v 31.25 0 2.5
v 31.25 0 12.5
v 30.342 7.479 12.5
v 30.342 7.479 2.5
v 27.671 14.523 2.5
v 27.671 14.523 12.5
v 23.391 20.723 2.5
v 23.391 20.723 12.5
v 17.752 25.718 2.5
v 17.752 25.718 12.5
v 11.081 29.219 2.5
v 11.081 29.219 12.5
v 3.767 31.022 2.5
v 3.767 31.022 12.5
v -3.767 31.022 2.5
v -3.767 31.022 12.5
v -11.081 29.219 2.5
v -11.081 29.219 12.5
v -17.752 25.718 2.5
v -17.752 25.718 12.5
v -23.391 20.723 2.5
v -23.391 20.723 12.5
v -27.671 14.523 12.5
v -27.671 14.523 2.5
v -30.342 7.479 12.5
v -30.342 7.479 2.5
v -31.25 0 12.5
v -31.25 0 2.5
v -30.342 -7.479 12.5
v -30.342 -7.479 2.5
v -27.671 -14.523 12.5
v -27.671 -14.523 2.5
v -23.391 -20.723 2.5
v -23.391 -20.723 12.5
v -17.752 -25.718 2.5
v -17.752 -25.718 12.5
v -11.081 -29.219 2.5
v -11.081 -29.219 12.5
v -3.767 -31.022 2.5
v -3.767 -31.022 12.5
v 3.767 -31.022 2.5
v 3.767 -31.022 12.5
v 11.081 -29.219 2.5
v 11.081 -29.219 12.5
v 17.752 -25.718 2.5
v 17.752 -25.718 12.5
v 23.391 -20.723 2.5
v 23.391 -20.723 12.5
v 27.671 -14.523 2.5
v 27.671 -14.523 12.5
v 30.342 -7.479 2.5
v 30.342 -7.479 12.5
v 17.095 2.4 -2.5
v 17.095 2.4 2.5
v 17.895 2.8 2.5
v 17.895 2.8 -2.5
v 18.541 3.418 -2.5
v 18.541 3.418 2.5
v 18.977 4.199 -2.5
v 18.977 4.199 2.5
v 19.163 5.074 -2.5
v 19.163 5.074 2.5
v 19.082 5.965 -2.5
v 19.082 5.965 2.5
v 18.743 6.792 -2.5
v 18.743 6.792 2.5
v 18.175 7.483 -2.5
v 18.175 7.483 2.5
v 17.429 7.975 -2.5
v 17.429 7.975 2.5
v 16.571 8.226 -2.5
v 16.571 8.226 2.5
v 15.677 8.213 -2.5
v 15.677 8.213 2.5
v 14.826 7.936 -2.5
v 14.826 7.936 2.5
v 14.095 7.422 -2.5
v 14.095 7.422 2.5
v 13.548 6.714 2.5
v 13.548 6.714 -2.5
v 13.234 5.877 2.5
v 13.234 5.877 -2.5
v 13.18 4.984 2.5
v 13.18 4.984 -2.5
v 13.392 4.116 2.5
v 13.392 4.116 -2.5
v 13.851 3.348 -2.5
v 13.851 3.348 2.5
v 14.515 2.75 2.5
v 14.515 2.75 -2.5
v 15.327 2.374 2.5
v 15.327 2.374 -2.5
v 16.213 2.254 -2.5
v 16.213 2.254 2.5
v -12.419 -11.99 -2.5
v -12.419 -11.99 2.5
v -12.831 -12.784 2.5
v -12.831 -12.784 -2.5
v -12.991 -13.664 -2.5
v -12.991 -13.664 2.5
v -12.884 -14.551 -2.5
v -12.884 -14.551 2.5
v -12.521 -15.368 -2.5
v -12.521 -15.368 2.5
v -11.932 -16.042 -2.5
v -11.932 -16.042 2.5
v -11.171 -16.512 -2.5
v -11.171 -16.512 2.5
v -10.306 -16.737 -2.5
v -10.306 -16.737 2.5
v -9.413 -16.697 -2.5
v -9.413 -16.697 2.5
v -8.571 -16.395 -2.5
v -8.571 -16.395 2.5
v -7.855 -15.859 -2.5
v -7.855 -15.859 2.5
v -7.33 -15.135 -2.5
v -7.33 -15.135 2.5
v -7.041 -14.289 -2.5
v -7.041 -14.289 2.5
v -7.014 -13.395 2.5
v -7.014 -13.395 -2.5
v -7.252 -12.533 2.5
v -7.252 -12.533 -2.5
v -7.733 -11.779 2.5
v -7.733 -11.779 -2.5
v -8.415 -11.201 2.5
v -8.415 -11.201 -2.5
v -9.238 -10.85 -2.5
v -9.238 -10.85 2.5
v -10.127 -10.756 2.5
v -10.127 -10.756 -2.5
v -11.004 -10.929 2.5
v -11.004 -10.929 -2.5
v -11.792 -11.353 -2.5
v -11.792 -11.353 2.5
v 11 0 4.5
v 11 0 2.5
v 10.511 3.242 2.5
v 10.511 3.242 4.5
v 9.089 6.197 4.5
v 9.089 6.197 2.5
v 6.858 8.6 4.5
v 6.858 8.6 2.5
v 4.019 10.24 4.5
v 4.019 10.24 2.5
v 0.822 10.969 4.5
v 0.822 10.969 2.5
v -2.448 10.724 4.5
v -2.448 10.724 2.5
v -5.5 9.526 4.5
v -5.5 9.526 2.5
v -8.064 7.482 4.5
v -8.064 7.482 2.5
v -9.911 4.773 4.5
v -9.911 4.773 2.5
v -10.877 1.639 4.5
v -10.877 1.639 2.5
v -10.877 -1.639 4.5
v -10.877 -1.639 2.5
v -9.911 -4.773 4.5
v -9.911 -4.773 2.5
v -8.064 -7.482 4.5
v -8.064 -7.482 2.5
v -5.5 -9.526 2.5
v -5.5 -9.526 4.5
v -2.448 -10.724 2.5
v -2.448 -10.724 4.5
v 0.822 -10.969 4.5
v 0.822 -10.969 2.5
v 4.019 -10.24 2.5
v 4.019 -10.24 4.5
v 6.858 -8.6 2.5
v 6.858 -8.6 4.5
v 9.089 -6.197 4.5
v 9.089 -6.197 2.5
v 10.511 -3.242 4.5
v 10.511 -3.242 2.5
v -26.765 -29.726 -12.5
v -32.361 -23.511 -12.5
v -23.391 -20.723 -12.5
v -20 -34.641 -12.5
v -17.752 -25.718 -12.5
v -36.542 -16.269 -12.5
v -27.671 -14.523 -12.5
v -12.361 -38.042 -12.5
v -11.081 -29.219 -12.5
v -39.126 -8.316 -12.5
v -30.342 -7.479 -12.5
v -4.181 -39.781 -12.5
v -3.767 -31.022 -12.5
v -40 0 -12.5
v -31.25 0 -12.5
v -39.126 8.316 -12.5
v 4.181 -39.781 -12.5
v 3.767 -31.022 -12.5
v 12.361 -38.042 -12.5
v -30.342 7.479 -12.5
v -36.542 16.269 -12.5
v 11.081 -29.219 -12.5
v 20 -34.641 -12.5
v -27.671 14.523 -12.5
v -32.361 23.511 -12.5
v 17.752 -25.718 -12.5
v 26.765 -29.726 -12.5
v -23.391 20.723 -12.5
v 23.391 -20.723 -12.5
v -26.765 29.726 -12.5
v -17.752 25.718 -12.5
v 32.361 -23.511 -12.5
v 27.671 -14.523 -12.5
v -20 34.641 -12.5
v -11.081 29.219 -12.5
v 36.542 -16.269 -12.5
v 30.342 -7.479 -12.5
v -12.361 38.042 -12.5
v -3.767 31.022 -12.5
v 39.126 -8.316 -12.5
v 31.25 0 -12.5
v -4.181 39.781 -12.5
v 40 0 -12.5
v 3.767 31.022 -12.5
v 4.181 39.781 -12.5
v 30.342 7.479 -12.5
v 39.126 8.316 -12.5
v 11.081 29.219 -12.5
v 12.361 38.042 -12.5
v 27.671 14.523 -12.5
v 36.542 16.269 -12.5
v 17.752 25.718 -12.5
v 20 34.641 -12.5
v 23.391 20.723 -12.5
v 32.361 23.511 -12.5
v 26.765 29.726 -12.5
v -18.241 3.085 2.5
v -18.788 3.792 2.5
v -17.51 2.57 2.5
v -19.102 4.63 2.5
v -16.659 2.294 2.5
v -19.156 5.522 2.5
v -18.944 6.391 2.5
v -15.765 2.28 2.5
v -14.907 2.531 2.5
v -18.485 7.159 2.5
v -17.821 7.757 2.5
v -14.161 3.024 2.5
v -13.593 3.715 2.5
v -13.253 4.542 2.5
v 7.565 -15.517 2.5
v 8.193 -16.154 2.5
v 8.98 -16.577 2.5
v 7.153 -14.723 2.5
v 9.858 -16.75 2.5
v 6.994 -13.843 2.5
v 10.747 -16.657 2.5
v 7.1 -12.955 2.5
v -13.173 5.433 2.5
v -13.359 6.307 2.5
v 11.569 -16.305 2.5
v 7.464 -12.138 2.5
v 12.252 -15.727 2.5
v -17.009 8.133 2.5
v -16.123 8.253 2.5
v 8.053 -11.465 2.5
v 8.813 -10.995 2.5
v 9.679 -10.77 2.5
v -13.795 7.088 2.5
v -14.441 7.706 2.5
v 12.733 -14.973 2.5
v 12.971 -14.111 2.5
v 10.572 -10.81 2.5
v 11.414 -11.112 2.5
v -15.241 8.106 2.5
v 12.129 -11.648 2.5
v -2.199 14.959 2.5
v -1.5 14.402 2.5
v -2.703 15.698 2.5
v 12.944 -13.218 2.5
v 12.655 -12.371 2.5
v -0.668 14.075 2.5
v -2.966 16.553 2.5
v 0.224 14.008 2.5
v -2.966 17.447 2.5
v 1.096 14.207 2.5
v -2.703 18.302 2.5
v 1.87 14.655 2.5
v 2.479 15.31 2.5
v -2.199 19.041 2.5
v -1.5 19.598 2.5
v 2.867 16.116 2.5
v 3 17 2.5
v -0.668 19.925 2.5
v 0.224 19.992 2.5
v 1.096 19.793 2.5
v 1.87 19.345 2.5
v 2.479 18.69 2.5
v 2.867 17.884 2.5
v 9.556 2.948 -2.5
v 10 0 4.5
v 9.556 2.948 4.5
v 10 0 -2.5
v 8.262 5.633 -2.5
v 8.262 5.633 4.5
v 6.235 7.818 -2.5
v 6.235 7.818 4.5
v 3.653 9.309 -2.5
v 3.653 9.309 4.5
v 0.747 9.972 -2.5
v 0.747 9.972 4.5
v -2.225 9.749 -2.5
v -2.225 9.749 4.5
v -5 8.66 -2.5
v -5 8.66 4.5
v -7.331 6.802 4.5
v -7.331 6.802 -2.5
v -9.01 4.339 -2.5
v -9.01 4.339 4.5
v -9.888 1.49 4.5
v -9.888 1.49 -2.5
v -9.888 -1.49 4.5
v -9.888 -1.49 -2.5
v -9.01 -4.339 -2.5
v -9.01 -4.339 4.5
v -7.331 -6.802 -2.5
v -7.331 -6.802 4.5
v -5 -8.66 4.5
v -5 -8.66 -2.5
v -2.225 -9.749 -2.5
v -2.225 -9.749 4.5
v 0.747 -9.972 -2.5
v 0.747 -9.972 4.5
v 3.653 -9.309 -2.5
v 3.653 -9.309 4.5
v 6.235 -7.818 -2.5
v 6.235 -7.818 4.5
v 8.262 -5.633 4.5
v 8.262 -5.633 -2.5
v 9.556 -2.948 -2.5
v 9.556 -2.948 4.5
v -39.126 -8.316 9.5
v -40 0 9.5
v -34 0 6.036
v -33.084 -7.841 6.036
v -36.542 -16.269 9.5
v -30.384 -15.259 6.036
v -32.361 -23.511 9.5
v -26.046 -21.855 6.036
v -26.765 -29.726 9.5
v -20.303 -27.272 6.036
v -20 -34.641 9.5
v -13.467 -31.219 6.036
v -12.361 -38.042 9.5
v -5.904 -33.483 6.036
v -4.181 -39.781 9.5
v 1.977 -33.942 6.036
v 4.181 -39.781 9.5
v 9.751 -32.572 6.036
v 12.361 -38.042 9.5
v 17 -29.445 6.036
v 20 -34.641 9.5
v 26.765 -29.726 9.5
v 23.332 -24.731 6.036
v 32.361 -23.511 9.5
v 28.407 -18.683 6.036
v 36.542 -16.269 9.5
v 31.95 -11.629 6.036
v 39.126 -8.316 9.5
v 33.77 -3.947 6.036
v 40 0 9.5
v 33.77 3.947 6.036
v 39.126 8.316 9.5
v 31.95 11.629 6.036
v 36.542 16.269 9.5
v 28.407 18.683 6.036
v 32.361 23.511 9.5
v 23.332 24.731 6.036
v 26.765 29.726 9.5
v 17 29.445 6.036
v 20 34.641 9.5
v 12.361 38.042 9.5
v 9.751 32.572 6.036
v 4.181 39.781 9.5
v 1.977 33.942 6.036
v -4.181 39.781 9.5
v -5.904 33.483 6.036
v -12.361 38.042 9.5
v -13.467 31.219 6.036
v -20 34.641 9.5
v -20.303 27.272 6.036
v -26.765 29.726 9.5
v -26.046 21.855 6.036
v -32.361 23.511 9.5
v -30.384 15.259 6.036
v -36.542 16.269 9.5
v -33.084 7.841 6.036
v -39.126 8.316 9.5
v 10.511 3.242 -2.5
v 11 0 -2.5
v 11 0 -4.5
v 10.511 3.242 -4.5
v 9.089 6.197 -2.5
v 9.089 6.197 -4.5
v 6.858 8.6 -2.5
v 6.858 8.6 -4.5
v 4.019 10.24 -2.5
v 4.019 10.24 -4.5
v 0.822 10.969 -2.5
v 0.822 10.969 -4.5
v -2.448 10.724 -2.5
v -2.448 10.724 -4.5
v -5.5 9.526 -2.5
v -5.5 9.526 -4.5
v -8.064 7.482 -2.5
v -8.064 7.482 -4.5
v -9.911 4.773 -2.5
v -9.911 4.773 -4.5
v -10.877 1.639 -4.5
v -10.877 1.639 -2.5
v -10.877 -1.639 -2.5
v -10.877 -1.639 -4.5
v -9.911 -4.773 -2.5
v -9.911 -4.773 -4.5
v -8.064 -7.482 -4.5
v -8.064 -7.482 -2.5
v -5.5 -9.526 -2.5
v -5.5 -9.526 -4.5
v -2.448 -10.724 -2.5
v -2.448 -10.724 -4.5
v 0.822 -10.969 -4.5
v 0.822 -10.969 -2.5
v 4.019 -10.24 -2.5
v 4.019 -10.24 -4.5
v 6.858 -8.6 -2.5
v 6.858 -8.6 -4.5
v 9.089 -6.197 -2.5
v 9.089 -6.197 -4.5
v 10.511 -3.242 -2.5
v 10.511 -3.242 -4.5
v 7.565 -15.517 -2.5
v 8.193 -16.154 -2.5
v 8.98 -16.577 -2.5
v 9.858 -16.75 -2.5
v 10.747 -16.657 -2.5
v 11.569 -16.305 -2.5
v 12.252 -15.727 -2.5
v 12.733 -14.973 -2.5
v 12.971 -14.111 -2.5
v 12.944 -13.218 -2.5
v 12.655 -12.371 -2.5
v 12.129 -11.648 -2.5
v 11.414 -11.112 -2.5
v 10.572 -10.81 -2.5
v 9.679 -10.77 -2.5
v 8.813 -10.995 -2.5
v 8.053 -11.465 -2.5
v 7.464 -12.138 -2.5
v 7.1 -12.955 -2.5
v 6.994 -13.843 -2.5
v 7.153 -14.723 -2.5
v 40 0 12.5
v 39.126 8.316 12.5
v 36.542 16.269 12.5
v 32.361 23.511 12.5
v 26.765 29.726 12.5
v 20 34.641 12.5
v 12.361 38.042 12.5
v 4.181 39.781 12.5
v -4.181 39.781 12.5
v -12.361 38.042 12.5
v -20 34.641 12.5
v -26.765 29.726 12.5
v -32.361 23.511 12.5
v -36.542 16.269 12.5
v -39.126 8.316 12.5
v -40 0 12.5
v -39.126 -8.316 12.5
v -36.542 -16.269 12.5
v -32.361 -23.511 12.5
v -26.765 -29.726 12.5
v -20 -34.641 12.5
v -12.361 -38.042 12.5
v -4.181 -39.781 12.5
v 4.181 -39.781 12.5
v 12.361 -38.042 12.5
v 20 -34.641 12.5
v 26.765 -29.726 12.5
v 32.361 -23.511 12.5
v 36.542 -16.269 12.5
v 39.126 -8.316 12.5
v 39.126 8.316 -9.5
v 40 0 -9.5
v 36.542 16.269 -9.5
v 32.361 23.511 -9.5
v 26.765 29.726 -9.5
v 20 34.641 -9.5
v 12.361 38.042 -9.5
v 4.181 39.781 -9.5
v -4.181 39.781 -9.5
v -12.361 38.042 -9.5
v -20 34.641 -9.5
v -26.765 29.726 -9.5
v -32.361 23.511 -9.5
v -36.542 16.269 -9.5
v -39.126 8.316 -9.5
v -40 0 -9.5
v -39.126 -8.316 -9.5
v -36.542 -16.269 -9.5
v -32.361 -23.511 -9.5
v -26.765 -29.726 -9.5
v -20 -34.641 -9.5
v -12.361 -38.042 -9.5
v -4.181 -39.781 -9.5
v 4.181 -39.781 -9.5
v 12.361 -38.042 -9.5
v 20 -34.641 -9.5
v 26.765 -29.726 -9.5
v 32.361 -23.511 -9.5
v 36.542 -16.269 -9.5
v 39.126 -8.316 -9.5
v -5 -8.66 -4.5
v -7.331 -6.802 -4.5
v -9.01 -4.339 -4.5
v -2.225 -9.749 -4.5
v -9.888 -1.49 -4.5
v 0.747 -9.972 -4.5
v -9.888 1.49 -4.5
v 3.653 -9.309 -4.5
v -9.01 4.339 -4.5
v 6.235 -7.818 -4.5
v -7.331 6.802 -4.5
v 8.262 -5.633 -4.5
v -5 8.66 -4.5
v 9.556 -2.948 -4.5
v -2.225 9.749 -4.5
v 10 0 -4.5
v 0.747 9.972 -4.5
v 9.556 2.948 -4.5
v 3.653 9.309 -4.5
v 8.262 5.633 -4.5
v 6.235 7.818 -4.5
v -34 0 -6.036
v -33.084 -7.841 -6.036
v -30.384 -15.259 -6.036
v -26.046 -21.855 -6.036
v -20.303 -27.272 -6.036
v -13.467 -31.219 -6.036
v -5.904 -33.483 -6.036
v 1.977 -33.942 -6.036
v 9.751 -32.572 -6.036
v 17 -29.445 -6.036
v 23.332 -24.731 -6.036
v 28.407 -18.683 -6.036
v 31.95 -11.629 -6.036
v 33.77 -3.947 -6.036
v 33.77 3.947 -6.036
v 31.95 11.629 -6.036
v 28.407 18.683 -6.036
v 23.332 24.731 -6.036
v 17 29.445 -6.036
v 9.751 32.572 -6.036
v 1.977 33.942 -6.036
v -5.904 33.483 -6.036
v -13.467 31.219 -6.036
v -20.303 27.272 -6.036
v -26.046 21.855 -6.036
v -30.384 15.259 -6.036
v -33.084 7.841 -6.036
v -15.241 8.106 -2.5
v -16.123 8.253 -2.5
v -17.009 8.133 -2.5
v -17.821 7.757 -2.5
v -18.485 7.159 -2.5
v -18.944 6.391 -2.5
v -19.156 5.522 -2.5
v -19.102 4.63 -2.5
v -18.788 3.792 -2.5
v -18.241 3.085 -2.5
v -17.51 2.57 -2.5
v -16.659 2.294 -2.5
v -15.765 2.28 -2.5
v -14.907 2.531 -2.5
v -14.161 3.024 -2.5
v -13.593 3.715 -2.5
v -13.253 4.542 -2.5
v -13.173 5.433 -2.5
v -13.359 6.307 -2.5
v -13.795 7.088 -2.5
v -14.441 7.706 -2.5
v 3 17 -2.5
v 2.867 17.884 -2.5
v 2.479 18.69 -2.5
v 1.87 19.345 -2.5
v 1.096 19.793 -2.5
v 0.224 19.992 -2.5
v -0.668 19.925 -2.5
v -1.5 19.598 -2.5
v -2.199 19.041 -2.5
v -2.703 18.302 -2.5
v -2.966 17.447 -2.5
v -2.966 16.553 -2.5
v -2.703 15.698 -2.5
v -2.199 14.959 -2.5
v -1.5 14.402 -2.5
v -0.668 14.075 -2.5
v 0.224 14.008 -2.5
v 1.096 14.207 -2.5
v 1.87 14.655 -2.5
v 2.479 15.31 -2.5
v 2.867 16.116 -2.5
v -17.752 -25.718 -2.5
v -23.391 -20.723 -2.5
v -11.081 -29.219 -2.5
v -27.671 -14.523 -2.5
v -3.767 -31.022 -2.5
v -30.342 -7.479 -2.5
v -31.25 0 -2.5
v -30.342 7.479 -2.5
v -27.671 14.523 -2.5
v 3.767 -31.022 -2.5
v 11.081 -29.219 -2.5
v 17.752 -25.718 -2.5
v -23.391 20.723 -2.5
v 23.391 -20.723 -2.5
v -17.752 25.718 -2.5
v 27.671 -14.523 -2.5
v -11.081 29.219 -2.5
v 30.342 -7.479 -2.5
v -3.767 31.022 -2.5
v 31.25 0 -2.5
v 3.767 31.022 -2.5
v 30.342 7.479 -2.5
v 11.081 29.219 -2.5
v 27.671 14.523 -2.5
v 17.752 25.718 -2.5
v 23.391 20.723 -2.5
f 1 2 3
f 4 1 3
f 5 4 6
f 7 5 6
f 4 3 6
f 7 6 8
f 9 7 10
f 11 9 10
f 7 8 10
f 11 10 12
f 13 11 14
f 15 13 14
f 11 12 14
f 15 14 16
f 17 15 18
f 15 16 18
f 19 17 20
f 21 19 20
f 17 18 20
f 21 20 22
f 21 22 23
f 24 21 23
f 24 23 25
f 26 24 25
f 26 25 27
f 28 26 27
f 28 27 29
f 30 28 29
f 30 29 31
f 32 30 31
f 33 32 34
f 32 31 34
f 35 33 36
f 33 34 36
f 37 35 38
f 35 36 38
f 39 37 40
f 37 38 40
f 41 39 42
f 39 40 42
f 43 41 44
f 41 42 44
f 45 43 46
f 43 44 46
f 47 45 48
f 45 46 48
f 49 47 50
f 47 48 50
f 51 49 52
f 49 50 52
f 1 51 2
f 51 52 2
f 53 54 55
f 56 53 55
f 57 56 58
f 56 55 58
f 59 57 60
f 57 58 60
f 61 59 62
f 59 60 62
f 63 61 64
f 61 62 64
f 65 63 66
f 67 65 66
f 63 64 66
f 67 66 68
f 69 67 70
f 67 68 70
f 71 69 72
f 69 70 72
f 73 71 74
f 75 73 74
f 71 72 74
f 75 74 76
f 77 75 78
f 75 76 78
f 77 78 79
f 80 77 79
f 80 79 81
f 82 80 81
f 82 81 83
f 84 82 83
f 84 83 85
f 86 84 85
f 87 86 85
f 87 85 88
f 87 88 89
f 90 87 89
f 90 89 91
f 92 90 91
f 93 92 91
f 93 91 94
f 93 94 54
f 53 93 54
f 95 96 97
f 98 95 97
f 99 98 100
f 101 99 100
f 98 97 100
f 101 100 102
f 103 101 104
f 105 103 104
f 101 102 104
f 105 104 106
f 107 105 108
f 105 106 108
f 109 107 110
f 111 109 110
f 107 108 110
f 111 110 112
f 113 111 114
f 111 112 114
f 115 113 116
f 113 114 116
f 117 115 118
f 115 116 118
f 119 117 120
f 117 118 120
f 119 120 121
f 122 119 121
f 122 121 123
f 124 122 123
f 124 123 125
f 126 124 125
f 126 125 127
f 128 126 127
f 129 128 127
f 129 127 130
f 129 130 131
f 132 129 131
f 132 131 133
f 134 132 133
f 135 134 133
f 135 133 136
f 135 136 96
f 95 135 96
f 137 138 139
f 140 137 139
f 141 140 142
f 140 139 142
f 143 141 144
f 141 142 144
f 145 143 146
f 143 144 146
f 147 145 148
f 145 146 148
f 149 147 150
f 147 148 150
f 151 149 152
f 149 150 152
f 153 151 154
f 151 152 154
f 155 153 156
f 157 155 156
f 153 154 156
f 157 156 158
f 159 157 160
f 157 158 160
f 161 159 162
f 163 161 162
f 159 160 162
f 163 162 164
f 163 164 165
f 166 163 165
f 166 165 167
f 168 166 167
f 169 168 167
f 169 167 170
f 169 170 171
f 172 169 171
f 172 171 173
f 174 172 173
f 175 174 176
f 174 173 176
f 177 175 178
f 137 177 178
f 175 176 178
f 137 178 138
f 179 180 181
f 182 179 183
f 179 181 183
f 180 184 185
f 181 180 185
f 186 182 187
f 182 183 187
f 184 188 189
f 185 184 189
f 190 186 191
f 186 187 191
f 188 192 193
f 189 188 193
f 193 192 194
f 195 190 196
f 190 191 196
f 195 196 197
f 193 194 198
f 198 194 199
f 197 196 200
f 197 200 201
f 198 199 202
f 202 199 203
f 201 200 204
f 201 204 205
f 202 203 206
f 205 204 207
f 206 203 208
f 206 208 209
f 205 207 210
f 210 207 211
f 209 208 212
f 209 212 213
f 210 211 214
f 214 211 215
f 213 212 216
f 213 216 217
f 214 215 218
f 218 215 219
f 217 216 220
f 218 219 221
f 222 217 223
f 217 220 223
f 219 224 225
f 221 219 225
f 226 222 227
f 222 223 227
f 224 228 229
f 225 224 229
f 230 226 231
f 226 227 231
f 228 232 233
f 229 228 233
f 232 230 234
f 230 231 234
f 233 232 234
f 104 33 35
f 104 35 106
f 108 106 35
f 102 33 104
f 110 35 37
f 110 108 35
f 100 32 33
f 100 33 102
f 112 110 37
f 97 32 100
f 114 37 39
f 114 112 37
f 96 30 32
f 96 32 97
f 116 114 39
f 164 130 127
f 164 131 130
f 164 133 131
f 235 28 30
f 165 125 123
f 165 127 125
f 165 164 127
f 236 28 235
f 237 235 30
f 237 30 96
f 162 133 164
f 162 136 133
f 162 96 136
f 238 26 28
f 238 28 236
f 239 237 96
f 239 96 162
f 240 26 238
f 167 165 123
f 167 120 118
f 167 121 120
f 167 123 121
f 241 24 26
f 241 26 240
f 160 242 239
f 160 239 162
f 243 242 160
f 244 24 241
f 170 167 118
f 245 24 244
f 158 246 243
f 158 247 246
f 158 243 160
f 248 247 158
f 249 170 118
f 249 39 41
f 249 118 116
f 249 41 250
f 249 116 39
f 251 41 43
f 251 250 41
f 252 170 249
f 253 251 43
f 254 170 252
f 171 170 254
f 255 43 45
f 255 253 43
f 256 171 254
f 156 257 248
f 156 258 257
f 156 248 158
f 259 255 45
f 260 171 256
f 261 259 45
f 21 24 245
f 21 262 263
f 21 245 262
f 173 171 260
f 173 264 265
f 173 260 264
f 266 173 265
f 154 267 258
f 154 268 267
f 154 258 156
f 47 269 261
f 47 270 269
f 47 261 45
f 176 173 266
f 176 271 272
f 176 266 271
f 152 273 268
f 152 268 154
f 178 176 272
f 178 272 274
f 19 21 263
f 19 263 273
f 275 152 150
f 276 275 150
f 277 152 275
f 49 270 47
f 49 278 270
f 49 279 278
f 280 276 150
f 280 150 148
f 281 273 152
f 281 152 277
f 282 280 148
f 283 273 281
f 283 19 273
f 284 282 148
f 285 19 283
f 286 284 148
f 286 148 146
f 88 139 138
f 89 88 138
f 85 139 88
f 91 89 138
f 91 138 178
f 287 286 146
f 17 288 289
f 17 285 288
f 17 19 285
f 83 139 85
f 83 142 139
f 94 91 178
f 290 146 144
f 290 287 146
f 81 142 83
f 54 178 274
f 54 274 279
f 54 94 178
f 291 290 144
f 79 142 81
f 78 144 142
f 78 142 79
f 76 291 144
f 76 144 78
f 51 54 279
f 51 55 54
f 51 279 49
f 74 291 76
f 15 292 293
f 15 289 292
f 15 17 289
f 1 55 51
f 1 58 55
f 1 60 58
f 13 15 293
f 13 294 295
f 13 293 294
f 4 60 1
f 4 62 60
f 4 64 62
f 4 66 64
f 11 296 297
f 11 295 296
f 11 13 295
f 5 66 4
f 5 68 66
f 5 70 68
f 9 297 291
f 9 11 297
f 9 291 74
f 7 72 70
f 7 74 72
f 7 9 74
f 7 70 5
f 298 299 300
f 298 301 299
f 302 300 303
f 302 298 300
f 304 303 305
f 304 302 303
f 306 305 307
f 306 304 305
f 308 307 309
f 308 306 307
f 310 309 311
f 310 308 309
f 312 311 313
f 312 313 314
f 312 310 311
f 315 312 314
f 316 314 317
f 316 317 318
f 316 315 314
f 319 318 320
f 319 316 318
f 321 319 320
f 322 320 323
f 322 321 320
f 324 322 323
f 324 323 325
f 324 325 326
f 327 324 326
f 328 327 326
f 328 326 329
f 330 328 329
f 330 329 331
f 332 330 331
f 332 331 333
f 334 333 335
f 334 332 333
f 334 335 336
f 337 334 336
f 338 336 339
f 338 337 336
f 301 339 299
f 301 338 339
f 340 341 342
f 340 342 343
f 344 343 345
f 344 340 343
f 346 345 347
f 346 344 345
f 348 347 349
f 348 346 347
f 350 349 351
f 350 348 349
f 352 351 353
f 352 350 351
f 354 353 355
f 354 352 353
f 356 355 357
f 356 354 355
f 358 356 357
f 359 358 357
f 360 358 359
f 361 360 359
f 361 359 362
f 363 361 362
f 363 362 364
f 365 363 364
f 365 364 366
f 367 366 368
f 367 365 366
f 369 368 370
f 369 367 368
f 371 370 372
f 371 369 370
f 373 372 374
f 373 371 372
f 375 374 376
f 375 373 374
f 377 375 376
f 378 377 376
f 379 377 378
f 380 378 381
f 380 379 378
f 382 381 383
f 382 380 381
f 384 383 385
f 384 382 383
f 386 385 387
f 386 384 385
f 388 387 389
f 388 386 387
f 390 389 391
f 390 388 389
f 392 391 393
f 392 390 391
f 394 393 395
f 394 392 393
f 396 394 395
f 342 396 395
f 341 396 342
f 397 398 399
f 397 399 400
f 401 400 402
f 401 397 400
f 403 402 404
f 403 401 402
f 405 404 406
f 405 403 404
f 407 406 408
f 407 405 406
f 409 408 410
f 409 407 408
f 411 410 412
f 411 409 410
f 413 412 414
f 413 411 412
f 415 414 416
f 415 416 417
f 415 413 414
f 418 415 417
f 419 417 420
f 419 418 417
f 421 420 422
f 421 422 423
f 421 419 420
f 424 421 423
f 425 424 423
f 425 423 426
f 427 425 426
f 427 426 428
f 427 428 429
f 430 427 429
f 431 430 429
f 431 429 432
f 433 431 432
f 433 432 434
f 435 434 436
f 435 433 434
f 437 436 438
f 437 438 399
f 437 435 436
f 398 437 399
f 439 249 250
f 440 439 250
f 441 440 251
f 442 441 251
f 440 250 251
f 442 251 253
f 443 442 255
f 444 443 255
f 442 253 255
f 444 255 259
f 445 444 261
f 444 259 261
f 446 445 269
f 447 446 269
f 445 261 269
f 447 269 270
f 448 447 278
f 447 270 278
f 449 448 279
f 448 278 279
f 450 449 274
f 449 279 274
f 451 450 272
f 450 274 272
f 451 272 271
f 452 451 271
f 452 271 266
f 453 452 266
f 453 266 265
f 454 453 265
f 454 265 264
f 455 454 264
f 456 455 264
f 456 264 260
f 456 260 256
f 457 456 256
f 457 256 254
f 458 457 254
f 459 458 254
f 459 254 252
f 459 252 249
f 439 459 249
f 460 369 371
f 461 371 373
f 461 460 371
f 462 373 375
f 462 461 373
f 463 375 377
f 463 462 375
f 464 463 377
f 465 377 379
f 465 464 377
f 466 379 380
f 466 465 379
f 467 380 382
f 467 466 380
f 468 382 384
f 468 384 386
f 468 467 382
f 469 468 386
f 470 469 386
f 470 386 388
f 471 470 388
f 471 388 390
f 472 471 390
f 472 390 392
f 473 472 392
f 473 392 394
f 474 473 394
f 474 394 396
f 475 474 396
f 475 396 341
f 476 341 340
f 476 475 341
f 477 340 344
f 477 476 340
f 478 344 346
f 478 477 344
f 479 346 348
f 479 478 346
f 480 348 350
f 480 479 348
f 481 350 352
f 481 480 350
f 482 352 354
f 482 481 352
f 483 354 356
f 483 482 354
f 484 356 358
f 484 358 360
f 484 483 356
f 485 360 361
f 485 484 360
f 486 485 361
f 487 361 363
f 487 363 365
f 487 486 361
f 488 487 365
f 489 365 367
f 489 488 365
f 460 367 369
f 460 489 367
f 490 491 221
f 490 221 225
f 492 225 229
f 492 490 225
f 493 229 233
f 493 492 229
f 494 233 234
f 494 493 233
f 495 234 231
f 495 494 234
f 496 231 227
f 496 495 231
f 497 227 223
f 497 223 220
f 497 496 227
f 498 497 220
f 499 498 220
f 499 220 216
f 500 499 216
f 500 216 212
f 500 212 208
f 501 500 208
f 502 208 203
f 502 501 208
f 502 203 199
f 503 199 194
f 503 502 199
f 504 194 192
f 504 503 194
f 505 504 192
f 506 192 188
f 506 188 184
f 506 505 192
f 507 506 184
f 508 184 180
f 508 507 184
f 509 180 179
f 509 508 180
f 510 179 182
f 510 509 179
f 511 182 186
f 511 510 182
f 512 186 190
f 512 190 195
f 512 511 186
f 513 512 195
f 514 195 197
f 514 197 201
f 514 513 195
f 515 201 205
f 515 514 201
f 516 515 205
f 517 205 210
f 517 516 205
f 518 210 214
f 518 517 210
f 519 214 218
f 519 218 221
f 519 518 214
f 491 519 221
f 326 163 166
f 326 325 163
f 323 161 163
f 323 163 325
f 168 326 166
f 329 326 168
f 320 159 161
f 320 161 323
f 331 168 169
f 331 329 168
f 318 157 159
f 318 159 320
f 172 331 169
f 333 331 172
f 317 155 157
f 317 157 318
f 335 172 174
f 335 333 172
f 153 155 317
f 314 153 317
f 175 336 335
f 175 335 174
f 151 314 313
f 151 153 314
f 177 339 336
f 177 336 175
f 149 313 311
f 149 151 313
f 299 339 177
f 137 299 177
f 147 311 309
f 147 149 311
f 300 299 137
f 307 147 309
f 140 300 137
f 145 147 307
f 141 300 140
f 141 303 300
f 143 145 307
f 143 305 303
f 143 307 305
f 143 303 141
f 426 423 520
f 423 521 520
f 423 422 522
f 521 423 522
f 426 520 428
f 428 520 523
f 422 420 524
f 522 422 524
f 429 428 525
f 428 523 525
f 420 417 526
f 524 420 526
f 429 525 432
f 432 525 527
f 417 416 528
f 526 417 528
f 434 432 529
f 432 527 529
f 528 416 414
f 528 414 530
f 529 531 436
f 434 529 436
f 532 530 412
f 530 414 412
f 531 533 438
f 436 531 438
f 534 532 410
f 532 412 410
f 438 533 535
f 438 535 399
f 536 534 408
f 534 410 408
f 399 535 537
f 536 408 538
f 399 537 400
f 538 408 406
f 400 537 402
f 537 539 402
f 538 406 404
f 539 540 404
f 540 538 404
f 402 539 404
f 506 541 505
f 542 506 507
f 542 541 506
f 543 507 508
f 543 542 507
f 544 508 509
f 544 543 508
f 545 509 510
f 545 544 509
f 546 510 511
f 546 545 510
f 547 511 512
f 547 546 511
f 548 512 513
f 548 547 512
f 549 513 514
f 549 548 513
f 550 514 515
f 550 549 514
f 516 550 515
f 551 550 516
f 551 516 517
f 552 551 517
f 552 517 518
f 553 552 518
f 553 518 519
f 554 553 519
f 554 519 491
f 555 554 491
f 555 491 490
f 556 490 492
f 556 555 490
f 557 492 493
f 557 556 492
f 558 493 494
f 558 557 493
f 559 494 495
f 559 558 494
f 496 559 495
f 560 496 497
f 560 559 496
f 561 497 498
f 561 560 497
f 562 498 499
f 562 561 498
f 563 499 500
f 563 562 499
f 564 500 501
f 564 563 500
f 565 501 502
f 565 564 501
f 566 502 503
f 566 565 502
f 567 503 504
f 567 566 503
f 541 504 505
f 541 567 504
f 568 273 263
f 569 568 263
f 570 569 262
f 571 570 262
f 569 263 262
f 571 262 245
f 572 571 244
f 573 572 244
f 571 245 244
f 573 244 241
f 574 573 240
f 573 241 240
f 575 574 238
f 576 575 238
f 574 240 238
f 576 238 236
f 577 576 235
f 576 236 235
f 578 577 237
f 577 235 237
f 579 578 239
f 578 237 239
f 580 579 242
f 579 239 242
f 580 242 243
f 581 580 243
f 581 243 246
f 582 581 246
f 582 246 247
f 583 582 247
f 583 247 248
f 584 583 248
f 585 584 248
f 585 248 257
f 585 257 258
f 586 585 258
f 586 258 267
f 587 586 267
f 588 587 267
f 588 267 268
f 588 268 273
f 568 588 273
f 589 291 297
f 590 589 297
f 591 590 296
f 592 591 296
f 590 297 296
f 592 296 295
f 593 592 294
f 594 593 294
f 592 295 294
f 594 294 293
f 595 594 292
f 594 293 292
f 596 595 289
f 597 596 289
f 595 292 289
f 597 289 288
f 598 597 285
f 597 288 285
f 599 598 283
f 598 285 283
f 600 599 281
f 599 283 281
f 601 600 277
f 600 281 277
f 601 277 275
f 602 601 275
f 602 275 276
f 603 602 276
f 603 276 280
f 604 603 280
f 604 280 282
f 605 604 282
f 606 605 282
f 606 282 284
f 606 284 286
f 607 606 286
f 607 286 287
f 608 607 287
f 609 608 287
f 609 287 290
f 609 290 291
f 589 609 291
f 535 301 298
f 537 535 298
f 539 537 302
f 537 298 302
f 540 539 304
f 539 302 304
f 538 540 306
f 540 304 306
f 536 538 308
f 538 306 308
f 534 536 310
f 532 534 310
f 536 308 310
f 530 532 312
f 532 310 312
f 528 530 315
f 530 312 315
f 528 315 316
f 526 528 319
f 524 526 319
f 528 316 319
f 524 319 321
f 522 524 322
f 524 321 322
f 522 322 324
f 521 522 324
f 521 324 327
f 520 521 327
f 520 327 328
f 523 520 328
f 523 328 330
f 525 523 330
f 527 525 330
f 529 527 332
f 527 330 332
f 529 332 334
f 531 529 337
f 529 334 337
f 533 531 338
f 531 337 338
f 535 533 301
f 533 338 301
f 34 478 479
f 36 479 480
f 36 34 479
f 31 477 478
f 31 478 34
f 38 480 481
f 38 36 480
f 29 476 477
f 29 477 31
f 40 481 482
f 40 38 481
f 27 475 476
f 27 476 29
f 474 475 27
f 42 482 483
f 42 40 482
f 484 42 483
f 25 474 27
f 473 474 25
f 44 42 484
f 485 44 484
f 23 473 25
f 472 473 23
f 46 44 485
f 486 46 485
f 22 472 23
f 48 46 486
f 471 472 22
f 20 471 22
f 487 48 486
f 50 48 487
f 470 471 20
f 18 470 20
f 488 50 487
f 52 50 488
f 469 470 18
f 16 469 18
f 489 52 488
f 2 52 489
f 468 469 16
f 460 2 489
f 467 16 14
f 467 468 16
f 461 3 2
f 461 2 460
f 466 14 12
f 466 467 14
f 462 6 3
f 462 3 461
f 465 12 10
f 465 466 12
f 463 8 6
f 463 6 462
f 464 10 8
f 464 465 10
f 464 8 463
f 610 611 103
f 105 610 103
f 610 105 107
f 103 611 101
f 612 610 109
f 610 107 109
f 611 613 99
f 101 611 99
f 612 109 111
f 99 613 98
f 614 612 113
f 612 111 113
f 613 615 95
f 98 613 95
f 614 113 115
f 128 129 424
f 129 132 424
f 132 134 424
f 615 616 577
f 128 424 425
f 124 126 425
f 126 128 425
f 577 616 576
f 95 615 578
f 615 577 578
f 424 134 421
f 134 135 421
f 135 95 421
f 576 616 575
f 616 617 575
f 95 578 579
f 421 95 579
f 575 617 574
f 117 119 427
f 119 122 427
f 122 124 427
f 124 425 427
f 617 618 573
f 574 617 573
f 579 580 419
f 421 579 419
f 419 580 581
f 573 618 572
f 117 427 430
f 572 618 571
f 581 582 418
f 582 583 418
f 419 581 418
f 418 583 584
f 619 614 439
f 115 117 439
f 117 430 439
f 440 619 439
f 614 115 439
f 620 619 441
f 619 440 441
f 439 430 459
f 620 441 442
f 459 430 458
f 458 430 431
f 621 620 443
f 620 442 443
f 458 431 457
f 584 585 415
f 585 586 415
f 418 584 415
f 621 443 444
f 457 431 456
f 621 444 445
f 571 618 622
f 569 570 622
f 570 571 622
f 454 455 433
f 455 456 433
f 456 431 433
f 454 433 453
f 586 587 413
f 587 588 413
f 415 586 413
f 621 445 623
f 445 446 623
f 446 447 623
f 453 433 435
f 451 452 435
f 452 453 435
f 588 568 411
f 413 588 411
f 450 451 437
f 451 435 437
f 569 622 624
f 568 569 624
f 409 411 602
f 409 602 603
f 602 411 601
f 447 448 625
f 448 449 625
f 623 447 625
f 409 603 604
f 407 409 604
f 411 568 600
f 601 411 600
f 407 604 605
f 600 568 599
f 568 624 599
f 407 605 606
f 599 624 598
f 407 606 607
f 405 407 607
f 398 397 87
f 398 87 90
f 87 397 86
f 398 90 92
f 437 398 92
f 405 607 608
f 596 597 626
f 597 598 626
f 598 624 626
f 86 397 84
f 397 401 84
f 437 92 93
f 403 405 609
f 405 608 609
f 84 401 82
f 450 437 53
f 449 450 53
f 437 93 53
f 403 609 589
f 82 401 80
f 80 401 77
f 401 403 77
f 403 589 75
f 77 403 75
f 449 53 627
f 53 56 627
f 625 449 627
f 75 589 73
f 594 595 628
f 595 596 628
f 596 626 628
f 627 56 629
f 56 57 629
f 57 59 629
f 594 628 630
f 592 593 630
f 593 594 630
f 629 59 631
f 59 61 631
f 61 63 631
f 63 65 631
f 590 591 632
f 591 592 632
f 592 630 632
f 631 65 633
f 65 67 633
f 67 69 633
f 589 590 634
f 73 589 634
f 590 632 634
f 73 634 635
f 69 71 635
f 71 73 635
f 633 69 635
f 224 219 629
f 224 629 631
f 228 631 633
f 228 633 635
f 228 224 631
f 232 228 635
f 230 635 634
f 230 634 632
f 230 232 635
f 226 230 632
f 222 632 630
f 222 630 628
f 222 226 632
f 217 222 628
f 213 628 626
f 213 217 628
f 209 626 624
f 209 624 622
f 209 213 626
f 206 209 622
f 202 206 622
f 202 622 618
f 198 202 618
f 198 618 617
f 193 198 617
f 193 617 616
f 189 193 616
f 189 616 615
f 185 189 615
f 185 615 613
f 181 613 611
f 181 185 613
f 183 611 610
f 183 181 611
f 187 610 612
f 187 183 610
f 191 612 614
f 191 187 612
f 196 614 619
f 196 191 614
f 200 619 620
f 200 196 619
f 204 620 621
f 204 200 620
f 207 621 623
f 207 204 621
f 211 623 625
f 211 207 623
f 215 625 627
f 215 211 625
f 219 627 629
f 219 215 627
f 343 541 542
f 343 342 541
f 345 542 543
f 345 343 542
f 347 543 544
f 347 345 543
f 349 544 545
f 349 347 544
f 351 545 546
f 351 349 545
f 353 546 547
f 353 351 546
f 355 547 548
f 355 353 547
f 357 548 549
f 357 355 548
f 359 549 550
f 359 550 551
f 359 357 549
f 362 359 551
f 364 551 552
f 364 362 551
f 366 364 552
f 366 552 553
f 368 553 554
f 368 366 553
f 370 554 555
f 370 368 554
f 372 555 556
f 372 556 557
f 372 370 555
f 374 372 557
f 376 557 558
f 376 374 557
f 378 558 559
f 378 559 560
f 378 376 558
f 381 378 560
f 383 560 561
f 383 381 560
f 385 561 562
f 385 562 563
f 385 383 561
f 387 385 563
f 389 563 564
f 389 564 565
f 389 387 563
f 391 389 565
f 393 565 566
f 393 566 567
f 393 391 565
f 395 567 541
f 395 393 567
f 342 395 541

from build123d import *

# Parameters (mm, degrees)
SKETCH2_R           = 40
SKETCH2_R_2         = 10
BOSS_EXTRUDE1_DEPTH = 12.5
SKETCH3_R           = 31.25
CUT_EXTRUDE1_DEPTH  = 10
SKETCH6_R           = 11
SKETCH6_R_2         = 10
BOSS_EXTRUDE2_DEPTH = 2
SKETCH4_R           = 3
CUT_EXTRUDE2_DEPTH  = 59.523499554
CIRPATTERN1_COUNT   = 5


with BuildPart() as part:
    # Sketch2 → Boss-Extrude1 (new, symmetric)
    with BuildSketch(Plane.XY):
        Circle(SKETCH2_R)
        Circle(SKETCH2_R_2, mode=Mode.SUBTRACT)
    extrude(amount=BOSS_EXTRUDE1_DEPTH, both=True)

    # Sketch3 → Cut-Extrude1 (cut)
    with BuildSketch(Plane.XY.offset(12.5)):
        Circle(SKETCH3_R)
    cut_extrude1 = extrude(amount=-CUT_EXTRUDE1_DEPTH, mode=Mode.SUBTRACT)

    # Sketch6 → Boss-Extrude2 (add)
    with BuildSketch(Plane.XY.offset(2.5)):
        Circle(SKETCH6_R)
        Circle(SKETCH6_R_2, mode=Mode.SUBTRACT)
    boss_extrude2 = extrude(amount=BOSS_EXTRUDE2_DEPTH)

    # Mirror1: Cut-Extrude1, Boss-Extrude2 across plane
    add(cut_extrude1.mirror(Plane.XY), mode=Mode.SUBTRACT)
    add(boss_extrude2.mirror(Plane.XY))

    # Sketch4 → Cut-Extrude2 (cut, through all)
    with BuildSketch(Plane.XY.offset(2.5)):
        with Locations((0, 17)):
            Circle(SKETCH4_R)
    cut_extrude2 = extrude(amount=-CUT_EXTRUDE2_DEPTH, mode=Mode.SUBTRACT)

    # CirPattern1: Cut-Extrude2 ×5 about axis
    cirpattern1_axis = Axis((0, 0, 0), (0, 0, 1))
    for i in range(1, CIRPATTERN1_COUNT):
        add(cut_extrude2.rotate(cirpattern1_axis, i * 360 / CIRPATTERN1_COUNT), mode=Mode.SUBTRACT)

    # Sketch5 → Cut-Revolve1 (revolve, cut)
    with BuildSketch(Plane(origin=(0, 0, 0), x_dir=(1, 0, 0), z_dir=(0, 1, 0)), mode=Mode.PRIVATE) as cut_revolve1_sk:
        Polygon((40, 9.5), (34, 6.035898385), (34, -6.035898385), (40, -9.5), align=None)
    revolve(cut_revolve1_sk.sketch.rotate(Axis((0, 0, -19.267509915), (0, 0, 1)), 180), axis=Axis((0, 0, -19.267509915), (0, 0, 1)), mode=Mode.SUBTRACT)


solid = part.part
